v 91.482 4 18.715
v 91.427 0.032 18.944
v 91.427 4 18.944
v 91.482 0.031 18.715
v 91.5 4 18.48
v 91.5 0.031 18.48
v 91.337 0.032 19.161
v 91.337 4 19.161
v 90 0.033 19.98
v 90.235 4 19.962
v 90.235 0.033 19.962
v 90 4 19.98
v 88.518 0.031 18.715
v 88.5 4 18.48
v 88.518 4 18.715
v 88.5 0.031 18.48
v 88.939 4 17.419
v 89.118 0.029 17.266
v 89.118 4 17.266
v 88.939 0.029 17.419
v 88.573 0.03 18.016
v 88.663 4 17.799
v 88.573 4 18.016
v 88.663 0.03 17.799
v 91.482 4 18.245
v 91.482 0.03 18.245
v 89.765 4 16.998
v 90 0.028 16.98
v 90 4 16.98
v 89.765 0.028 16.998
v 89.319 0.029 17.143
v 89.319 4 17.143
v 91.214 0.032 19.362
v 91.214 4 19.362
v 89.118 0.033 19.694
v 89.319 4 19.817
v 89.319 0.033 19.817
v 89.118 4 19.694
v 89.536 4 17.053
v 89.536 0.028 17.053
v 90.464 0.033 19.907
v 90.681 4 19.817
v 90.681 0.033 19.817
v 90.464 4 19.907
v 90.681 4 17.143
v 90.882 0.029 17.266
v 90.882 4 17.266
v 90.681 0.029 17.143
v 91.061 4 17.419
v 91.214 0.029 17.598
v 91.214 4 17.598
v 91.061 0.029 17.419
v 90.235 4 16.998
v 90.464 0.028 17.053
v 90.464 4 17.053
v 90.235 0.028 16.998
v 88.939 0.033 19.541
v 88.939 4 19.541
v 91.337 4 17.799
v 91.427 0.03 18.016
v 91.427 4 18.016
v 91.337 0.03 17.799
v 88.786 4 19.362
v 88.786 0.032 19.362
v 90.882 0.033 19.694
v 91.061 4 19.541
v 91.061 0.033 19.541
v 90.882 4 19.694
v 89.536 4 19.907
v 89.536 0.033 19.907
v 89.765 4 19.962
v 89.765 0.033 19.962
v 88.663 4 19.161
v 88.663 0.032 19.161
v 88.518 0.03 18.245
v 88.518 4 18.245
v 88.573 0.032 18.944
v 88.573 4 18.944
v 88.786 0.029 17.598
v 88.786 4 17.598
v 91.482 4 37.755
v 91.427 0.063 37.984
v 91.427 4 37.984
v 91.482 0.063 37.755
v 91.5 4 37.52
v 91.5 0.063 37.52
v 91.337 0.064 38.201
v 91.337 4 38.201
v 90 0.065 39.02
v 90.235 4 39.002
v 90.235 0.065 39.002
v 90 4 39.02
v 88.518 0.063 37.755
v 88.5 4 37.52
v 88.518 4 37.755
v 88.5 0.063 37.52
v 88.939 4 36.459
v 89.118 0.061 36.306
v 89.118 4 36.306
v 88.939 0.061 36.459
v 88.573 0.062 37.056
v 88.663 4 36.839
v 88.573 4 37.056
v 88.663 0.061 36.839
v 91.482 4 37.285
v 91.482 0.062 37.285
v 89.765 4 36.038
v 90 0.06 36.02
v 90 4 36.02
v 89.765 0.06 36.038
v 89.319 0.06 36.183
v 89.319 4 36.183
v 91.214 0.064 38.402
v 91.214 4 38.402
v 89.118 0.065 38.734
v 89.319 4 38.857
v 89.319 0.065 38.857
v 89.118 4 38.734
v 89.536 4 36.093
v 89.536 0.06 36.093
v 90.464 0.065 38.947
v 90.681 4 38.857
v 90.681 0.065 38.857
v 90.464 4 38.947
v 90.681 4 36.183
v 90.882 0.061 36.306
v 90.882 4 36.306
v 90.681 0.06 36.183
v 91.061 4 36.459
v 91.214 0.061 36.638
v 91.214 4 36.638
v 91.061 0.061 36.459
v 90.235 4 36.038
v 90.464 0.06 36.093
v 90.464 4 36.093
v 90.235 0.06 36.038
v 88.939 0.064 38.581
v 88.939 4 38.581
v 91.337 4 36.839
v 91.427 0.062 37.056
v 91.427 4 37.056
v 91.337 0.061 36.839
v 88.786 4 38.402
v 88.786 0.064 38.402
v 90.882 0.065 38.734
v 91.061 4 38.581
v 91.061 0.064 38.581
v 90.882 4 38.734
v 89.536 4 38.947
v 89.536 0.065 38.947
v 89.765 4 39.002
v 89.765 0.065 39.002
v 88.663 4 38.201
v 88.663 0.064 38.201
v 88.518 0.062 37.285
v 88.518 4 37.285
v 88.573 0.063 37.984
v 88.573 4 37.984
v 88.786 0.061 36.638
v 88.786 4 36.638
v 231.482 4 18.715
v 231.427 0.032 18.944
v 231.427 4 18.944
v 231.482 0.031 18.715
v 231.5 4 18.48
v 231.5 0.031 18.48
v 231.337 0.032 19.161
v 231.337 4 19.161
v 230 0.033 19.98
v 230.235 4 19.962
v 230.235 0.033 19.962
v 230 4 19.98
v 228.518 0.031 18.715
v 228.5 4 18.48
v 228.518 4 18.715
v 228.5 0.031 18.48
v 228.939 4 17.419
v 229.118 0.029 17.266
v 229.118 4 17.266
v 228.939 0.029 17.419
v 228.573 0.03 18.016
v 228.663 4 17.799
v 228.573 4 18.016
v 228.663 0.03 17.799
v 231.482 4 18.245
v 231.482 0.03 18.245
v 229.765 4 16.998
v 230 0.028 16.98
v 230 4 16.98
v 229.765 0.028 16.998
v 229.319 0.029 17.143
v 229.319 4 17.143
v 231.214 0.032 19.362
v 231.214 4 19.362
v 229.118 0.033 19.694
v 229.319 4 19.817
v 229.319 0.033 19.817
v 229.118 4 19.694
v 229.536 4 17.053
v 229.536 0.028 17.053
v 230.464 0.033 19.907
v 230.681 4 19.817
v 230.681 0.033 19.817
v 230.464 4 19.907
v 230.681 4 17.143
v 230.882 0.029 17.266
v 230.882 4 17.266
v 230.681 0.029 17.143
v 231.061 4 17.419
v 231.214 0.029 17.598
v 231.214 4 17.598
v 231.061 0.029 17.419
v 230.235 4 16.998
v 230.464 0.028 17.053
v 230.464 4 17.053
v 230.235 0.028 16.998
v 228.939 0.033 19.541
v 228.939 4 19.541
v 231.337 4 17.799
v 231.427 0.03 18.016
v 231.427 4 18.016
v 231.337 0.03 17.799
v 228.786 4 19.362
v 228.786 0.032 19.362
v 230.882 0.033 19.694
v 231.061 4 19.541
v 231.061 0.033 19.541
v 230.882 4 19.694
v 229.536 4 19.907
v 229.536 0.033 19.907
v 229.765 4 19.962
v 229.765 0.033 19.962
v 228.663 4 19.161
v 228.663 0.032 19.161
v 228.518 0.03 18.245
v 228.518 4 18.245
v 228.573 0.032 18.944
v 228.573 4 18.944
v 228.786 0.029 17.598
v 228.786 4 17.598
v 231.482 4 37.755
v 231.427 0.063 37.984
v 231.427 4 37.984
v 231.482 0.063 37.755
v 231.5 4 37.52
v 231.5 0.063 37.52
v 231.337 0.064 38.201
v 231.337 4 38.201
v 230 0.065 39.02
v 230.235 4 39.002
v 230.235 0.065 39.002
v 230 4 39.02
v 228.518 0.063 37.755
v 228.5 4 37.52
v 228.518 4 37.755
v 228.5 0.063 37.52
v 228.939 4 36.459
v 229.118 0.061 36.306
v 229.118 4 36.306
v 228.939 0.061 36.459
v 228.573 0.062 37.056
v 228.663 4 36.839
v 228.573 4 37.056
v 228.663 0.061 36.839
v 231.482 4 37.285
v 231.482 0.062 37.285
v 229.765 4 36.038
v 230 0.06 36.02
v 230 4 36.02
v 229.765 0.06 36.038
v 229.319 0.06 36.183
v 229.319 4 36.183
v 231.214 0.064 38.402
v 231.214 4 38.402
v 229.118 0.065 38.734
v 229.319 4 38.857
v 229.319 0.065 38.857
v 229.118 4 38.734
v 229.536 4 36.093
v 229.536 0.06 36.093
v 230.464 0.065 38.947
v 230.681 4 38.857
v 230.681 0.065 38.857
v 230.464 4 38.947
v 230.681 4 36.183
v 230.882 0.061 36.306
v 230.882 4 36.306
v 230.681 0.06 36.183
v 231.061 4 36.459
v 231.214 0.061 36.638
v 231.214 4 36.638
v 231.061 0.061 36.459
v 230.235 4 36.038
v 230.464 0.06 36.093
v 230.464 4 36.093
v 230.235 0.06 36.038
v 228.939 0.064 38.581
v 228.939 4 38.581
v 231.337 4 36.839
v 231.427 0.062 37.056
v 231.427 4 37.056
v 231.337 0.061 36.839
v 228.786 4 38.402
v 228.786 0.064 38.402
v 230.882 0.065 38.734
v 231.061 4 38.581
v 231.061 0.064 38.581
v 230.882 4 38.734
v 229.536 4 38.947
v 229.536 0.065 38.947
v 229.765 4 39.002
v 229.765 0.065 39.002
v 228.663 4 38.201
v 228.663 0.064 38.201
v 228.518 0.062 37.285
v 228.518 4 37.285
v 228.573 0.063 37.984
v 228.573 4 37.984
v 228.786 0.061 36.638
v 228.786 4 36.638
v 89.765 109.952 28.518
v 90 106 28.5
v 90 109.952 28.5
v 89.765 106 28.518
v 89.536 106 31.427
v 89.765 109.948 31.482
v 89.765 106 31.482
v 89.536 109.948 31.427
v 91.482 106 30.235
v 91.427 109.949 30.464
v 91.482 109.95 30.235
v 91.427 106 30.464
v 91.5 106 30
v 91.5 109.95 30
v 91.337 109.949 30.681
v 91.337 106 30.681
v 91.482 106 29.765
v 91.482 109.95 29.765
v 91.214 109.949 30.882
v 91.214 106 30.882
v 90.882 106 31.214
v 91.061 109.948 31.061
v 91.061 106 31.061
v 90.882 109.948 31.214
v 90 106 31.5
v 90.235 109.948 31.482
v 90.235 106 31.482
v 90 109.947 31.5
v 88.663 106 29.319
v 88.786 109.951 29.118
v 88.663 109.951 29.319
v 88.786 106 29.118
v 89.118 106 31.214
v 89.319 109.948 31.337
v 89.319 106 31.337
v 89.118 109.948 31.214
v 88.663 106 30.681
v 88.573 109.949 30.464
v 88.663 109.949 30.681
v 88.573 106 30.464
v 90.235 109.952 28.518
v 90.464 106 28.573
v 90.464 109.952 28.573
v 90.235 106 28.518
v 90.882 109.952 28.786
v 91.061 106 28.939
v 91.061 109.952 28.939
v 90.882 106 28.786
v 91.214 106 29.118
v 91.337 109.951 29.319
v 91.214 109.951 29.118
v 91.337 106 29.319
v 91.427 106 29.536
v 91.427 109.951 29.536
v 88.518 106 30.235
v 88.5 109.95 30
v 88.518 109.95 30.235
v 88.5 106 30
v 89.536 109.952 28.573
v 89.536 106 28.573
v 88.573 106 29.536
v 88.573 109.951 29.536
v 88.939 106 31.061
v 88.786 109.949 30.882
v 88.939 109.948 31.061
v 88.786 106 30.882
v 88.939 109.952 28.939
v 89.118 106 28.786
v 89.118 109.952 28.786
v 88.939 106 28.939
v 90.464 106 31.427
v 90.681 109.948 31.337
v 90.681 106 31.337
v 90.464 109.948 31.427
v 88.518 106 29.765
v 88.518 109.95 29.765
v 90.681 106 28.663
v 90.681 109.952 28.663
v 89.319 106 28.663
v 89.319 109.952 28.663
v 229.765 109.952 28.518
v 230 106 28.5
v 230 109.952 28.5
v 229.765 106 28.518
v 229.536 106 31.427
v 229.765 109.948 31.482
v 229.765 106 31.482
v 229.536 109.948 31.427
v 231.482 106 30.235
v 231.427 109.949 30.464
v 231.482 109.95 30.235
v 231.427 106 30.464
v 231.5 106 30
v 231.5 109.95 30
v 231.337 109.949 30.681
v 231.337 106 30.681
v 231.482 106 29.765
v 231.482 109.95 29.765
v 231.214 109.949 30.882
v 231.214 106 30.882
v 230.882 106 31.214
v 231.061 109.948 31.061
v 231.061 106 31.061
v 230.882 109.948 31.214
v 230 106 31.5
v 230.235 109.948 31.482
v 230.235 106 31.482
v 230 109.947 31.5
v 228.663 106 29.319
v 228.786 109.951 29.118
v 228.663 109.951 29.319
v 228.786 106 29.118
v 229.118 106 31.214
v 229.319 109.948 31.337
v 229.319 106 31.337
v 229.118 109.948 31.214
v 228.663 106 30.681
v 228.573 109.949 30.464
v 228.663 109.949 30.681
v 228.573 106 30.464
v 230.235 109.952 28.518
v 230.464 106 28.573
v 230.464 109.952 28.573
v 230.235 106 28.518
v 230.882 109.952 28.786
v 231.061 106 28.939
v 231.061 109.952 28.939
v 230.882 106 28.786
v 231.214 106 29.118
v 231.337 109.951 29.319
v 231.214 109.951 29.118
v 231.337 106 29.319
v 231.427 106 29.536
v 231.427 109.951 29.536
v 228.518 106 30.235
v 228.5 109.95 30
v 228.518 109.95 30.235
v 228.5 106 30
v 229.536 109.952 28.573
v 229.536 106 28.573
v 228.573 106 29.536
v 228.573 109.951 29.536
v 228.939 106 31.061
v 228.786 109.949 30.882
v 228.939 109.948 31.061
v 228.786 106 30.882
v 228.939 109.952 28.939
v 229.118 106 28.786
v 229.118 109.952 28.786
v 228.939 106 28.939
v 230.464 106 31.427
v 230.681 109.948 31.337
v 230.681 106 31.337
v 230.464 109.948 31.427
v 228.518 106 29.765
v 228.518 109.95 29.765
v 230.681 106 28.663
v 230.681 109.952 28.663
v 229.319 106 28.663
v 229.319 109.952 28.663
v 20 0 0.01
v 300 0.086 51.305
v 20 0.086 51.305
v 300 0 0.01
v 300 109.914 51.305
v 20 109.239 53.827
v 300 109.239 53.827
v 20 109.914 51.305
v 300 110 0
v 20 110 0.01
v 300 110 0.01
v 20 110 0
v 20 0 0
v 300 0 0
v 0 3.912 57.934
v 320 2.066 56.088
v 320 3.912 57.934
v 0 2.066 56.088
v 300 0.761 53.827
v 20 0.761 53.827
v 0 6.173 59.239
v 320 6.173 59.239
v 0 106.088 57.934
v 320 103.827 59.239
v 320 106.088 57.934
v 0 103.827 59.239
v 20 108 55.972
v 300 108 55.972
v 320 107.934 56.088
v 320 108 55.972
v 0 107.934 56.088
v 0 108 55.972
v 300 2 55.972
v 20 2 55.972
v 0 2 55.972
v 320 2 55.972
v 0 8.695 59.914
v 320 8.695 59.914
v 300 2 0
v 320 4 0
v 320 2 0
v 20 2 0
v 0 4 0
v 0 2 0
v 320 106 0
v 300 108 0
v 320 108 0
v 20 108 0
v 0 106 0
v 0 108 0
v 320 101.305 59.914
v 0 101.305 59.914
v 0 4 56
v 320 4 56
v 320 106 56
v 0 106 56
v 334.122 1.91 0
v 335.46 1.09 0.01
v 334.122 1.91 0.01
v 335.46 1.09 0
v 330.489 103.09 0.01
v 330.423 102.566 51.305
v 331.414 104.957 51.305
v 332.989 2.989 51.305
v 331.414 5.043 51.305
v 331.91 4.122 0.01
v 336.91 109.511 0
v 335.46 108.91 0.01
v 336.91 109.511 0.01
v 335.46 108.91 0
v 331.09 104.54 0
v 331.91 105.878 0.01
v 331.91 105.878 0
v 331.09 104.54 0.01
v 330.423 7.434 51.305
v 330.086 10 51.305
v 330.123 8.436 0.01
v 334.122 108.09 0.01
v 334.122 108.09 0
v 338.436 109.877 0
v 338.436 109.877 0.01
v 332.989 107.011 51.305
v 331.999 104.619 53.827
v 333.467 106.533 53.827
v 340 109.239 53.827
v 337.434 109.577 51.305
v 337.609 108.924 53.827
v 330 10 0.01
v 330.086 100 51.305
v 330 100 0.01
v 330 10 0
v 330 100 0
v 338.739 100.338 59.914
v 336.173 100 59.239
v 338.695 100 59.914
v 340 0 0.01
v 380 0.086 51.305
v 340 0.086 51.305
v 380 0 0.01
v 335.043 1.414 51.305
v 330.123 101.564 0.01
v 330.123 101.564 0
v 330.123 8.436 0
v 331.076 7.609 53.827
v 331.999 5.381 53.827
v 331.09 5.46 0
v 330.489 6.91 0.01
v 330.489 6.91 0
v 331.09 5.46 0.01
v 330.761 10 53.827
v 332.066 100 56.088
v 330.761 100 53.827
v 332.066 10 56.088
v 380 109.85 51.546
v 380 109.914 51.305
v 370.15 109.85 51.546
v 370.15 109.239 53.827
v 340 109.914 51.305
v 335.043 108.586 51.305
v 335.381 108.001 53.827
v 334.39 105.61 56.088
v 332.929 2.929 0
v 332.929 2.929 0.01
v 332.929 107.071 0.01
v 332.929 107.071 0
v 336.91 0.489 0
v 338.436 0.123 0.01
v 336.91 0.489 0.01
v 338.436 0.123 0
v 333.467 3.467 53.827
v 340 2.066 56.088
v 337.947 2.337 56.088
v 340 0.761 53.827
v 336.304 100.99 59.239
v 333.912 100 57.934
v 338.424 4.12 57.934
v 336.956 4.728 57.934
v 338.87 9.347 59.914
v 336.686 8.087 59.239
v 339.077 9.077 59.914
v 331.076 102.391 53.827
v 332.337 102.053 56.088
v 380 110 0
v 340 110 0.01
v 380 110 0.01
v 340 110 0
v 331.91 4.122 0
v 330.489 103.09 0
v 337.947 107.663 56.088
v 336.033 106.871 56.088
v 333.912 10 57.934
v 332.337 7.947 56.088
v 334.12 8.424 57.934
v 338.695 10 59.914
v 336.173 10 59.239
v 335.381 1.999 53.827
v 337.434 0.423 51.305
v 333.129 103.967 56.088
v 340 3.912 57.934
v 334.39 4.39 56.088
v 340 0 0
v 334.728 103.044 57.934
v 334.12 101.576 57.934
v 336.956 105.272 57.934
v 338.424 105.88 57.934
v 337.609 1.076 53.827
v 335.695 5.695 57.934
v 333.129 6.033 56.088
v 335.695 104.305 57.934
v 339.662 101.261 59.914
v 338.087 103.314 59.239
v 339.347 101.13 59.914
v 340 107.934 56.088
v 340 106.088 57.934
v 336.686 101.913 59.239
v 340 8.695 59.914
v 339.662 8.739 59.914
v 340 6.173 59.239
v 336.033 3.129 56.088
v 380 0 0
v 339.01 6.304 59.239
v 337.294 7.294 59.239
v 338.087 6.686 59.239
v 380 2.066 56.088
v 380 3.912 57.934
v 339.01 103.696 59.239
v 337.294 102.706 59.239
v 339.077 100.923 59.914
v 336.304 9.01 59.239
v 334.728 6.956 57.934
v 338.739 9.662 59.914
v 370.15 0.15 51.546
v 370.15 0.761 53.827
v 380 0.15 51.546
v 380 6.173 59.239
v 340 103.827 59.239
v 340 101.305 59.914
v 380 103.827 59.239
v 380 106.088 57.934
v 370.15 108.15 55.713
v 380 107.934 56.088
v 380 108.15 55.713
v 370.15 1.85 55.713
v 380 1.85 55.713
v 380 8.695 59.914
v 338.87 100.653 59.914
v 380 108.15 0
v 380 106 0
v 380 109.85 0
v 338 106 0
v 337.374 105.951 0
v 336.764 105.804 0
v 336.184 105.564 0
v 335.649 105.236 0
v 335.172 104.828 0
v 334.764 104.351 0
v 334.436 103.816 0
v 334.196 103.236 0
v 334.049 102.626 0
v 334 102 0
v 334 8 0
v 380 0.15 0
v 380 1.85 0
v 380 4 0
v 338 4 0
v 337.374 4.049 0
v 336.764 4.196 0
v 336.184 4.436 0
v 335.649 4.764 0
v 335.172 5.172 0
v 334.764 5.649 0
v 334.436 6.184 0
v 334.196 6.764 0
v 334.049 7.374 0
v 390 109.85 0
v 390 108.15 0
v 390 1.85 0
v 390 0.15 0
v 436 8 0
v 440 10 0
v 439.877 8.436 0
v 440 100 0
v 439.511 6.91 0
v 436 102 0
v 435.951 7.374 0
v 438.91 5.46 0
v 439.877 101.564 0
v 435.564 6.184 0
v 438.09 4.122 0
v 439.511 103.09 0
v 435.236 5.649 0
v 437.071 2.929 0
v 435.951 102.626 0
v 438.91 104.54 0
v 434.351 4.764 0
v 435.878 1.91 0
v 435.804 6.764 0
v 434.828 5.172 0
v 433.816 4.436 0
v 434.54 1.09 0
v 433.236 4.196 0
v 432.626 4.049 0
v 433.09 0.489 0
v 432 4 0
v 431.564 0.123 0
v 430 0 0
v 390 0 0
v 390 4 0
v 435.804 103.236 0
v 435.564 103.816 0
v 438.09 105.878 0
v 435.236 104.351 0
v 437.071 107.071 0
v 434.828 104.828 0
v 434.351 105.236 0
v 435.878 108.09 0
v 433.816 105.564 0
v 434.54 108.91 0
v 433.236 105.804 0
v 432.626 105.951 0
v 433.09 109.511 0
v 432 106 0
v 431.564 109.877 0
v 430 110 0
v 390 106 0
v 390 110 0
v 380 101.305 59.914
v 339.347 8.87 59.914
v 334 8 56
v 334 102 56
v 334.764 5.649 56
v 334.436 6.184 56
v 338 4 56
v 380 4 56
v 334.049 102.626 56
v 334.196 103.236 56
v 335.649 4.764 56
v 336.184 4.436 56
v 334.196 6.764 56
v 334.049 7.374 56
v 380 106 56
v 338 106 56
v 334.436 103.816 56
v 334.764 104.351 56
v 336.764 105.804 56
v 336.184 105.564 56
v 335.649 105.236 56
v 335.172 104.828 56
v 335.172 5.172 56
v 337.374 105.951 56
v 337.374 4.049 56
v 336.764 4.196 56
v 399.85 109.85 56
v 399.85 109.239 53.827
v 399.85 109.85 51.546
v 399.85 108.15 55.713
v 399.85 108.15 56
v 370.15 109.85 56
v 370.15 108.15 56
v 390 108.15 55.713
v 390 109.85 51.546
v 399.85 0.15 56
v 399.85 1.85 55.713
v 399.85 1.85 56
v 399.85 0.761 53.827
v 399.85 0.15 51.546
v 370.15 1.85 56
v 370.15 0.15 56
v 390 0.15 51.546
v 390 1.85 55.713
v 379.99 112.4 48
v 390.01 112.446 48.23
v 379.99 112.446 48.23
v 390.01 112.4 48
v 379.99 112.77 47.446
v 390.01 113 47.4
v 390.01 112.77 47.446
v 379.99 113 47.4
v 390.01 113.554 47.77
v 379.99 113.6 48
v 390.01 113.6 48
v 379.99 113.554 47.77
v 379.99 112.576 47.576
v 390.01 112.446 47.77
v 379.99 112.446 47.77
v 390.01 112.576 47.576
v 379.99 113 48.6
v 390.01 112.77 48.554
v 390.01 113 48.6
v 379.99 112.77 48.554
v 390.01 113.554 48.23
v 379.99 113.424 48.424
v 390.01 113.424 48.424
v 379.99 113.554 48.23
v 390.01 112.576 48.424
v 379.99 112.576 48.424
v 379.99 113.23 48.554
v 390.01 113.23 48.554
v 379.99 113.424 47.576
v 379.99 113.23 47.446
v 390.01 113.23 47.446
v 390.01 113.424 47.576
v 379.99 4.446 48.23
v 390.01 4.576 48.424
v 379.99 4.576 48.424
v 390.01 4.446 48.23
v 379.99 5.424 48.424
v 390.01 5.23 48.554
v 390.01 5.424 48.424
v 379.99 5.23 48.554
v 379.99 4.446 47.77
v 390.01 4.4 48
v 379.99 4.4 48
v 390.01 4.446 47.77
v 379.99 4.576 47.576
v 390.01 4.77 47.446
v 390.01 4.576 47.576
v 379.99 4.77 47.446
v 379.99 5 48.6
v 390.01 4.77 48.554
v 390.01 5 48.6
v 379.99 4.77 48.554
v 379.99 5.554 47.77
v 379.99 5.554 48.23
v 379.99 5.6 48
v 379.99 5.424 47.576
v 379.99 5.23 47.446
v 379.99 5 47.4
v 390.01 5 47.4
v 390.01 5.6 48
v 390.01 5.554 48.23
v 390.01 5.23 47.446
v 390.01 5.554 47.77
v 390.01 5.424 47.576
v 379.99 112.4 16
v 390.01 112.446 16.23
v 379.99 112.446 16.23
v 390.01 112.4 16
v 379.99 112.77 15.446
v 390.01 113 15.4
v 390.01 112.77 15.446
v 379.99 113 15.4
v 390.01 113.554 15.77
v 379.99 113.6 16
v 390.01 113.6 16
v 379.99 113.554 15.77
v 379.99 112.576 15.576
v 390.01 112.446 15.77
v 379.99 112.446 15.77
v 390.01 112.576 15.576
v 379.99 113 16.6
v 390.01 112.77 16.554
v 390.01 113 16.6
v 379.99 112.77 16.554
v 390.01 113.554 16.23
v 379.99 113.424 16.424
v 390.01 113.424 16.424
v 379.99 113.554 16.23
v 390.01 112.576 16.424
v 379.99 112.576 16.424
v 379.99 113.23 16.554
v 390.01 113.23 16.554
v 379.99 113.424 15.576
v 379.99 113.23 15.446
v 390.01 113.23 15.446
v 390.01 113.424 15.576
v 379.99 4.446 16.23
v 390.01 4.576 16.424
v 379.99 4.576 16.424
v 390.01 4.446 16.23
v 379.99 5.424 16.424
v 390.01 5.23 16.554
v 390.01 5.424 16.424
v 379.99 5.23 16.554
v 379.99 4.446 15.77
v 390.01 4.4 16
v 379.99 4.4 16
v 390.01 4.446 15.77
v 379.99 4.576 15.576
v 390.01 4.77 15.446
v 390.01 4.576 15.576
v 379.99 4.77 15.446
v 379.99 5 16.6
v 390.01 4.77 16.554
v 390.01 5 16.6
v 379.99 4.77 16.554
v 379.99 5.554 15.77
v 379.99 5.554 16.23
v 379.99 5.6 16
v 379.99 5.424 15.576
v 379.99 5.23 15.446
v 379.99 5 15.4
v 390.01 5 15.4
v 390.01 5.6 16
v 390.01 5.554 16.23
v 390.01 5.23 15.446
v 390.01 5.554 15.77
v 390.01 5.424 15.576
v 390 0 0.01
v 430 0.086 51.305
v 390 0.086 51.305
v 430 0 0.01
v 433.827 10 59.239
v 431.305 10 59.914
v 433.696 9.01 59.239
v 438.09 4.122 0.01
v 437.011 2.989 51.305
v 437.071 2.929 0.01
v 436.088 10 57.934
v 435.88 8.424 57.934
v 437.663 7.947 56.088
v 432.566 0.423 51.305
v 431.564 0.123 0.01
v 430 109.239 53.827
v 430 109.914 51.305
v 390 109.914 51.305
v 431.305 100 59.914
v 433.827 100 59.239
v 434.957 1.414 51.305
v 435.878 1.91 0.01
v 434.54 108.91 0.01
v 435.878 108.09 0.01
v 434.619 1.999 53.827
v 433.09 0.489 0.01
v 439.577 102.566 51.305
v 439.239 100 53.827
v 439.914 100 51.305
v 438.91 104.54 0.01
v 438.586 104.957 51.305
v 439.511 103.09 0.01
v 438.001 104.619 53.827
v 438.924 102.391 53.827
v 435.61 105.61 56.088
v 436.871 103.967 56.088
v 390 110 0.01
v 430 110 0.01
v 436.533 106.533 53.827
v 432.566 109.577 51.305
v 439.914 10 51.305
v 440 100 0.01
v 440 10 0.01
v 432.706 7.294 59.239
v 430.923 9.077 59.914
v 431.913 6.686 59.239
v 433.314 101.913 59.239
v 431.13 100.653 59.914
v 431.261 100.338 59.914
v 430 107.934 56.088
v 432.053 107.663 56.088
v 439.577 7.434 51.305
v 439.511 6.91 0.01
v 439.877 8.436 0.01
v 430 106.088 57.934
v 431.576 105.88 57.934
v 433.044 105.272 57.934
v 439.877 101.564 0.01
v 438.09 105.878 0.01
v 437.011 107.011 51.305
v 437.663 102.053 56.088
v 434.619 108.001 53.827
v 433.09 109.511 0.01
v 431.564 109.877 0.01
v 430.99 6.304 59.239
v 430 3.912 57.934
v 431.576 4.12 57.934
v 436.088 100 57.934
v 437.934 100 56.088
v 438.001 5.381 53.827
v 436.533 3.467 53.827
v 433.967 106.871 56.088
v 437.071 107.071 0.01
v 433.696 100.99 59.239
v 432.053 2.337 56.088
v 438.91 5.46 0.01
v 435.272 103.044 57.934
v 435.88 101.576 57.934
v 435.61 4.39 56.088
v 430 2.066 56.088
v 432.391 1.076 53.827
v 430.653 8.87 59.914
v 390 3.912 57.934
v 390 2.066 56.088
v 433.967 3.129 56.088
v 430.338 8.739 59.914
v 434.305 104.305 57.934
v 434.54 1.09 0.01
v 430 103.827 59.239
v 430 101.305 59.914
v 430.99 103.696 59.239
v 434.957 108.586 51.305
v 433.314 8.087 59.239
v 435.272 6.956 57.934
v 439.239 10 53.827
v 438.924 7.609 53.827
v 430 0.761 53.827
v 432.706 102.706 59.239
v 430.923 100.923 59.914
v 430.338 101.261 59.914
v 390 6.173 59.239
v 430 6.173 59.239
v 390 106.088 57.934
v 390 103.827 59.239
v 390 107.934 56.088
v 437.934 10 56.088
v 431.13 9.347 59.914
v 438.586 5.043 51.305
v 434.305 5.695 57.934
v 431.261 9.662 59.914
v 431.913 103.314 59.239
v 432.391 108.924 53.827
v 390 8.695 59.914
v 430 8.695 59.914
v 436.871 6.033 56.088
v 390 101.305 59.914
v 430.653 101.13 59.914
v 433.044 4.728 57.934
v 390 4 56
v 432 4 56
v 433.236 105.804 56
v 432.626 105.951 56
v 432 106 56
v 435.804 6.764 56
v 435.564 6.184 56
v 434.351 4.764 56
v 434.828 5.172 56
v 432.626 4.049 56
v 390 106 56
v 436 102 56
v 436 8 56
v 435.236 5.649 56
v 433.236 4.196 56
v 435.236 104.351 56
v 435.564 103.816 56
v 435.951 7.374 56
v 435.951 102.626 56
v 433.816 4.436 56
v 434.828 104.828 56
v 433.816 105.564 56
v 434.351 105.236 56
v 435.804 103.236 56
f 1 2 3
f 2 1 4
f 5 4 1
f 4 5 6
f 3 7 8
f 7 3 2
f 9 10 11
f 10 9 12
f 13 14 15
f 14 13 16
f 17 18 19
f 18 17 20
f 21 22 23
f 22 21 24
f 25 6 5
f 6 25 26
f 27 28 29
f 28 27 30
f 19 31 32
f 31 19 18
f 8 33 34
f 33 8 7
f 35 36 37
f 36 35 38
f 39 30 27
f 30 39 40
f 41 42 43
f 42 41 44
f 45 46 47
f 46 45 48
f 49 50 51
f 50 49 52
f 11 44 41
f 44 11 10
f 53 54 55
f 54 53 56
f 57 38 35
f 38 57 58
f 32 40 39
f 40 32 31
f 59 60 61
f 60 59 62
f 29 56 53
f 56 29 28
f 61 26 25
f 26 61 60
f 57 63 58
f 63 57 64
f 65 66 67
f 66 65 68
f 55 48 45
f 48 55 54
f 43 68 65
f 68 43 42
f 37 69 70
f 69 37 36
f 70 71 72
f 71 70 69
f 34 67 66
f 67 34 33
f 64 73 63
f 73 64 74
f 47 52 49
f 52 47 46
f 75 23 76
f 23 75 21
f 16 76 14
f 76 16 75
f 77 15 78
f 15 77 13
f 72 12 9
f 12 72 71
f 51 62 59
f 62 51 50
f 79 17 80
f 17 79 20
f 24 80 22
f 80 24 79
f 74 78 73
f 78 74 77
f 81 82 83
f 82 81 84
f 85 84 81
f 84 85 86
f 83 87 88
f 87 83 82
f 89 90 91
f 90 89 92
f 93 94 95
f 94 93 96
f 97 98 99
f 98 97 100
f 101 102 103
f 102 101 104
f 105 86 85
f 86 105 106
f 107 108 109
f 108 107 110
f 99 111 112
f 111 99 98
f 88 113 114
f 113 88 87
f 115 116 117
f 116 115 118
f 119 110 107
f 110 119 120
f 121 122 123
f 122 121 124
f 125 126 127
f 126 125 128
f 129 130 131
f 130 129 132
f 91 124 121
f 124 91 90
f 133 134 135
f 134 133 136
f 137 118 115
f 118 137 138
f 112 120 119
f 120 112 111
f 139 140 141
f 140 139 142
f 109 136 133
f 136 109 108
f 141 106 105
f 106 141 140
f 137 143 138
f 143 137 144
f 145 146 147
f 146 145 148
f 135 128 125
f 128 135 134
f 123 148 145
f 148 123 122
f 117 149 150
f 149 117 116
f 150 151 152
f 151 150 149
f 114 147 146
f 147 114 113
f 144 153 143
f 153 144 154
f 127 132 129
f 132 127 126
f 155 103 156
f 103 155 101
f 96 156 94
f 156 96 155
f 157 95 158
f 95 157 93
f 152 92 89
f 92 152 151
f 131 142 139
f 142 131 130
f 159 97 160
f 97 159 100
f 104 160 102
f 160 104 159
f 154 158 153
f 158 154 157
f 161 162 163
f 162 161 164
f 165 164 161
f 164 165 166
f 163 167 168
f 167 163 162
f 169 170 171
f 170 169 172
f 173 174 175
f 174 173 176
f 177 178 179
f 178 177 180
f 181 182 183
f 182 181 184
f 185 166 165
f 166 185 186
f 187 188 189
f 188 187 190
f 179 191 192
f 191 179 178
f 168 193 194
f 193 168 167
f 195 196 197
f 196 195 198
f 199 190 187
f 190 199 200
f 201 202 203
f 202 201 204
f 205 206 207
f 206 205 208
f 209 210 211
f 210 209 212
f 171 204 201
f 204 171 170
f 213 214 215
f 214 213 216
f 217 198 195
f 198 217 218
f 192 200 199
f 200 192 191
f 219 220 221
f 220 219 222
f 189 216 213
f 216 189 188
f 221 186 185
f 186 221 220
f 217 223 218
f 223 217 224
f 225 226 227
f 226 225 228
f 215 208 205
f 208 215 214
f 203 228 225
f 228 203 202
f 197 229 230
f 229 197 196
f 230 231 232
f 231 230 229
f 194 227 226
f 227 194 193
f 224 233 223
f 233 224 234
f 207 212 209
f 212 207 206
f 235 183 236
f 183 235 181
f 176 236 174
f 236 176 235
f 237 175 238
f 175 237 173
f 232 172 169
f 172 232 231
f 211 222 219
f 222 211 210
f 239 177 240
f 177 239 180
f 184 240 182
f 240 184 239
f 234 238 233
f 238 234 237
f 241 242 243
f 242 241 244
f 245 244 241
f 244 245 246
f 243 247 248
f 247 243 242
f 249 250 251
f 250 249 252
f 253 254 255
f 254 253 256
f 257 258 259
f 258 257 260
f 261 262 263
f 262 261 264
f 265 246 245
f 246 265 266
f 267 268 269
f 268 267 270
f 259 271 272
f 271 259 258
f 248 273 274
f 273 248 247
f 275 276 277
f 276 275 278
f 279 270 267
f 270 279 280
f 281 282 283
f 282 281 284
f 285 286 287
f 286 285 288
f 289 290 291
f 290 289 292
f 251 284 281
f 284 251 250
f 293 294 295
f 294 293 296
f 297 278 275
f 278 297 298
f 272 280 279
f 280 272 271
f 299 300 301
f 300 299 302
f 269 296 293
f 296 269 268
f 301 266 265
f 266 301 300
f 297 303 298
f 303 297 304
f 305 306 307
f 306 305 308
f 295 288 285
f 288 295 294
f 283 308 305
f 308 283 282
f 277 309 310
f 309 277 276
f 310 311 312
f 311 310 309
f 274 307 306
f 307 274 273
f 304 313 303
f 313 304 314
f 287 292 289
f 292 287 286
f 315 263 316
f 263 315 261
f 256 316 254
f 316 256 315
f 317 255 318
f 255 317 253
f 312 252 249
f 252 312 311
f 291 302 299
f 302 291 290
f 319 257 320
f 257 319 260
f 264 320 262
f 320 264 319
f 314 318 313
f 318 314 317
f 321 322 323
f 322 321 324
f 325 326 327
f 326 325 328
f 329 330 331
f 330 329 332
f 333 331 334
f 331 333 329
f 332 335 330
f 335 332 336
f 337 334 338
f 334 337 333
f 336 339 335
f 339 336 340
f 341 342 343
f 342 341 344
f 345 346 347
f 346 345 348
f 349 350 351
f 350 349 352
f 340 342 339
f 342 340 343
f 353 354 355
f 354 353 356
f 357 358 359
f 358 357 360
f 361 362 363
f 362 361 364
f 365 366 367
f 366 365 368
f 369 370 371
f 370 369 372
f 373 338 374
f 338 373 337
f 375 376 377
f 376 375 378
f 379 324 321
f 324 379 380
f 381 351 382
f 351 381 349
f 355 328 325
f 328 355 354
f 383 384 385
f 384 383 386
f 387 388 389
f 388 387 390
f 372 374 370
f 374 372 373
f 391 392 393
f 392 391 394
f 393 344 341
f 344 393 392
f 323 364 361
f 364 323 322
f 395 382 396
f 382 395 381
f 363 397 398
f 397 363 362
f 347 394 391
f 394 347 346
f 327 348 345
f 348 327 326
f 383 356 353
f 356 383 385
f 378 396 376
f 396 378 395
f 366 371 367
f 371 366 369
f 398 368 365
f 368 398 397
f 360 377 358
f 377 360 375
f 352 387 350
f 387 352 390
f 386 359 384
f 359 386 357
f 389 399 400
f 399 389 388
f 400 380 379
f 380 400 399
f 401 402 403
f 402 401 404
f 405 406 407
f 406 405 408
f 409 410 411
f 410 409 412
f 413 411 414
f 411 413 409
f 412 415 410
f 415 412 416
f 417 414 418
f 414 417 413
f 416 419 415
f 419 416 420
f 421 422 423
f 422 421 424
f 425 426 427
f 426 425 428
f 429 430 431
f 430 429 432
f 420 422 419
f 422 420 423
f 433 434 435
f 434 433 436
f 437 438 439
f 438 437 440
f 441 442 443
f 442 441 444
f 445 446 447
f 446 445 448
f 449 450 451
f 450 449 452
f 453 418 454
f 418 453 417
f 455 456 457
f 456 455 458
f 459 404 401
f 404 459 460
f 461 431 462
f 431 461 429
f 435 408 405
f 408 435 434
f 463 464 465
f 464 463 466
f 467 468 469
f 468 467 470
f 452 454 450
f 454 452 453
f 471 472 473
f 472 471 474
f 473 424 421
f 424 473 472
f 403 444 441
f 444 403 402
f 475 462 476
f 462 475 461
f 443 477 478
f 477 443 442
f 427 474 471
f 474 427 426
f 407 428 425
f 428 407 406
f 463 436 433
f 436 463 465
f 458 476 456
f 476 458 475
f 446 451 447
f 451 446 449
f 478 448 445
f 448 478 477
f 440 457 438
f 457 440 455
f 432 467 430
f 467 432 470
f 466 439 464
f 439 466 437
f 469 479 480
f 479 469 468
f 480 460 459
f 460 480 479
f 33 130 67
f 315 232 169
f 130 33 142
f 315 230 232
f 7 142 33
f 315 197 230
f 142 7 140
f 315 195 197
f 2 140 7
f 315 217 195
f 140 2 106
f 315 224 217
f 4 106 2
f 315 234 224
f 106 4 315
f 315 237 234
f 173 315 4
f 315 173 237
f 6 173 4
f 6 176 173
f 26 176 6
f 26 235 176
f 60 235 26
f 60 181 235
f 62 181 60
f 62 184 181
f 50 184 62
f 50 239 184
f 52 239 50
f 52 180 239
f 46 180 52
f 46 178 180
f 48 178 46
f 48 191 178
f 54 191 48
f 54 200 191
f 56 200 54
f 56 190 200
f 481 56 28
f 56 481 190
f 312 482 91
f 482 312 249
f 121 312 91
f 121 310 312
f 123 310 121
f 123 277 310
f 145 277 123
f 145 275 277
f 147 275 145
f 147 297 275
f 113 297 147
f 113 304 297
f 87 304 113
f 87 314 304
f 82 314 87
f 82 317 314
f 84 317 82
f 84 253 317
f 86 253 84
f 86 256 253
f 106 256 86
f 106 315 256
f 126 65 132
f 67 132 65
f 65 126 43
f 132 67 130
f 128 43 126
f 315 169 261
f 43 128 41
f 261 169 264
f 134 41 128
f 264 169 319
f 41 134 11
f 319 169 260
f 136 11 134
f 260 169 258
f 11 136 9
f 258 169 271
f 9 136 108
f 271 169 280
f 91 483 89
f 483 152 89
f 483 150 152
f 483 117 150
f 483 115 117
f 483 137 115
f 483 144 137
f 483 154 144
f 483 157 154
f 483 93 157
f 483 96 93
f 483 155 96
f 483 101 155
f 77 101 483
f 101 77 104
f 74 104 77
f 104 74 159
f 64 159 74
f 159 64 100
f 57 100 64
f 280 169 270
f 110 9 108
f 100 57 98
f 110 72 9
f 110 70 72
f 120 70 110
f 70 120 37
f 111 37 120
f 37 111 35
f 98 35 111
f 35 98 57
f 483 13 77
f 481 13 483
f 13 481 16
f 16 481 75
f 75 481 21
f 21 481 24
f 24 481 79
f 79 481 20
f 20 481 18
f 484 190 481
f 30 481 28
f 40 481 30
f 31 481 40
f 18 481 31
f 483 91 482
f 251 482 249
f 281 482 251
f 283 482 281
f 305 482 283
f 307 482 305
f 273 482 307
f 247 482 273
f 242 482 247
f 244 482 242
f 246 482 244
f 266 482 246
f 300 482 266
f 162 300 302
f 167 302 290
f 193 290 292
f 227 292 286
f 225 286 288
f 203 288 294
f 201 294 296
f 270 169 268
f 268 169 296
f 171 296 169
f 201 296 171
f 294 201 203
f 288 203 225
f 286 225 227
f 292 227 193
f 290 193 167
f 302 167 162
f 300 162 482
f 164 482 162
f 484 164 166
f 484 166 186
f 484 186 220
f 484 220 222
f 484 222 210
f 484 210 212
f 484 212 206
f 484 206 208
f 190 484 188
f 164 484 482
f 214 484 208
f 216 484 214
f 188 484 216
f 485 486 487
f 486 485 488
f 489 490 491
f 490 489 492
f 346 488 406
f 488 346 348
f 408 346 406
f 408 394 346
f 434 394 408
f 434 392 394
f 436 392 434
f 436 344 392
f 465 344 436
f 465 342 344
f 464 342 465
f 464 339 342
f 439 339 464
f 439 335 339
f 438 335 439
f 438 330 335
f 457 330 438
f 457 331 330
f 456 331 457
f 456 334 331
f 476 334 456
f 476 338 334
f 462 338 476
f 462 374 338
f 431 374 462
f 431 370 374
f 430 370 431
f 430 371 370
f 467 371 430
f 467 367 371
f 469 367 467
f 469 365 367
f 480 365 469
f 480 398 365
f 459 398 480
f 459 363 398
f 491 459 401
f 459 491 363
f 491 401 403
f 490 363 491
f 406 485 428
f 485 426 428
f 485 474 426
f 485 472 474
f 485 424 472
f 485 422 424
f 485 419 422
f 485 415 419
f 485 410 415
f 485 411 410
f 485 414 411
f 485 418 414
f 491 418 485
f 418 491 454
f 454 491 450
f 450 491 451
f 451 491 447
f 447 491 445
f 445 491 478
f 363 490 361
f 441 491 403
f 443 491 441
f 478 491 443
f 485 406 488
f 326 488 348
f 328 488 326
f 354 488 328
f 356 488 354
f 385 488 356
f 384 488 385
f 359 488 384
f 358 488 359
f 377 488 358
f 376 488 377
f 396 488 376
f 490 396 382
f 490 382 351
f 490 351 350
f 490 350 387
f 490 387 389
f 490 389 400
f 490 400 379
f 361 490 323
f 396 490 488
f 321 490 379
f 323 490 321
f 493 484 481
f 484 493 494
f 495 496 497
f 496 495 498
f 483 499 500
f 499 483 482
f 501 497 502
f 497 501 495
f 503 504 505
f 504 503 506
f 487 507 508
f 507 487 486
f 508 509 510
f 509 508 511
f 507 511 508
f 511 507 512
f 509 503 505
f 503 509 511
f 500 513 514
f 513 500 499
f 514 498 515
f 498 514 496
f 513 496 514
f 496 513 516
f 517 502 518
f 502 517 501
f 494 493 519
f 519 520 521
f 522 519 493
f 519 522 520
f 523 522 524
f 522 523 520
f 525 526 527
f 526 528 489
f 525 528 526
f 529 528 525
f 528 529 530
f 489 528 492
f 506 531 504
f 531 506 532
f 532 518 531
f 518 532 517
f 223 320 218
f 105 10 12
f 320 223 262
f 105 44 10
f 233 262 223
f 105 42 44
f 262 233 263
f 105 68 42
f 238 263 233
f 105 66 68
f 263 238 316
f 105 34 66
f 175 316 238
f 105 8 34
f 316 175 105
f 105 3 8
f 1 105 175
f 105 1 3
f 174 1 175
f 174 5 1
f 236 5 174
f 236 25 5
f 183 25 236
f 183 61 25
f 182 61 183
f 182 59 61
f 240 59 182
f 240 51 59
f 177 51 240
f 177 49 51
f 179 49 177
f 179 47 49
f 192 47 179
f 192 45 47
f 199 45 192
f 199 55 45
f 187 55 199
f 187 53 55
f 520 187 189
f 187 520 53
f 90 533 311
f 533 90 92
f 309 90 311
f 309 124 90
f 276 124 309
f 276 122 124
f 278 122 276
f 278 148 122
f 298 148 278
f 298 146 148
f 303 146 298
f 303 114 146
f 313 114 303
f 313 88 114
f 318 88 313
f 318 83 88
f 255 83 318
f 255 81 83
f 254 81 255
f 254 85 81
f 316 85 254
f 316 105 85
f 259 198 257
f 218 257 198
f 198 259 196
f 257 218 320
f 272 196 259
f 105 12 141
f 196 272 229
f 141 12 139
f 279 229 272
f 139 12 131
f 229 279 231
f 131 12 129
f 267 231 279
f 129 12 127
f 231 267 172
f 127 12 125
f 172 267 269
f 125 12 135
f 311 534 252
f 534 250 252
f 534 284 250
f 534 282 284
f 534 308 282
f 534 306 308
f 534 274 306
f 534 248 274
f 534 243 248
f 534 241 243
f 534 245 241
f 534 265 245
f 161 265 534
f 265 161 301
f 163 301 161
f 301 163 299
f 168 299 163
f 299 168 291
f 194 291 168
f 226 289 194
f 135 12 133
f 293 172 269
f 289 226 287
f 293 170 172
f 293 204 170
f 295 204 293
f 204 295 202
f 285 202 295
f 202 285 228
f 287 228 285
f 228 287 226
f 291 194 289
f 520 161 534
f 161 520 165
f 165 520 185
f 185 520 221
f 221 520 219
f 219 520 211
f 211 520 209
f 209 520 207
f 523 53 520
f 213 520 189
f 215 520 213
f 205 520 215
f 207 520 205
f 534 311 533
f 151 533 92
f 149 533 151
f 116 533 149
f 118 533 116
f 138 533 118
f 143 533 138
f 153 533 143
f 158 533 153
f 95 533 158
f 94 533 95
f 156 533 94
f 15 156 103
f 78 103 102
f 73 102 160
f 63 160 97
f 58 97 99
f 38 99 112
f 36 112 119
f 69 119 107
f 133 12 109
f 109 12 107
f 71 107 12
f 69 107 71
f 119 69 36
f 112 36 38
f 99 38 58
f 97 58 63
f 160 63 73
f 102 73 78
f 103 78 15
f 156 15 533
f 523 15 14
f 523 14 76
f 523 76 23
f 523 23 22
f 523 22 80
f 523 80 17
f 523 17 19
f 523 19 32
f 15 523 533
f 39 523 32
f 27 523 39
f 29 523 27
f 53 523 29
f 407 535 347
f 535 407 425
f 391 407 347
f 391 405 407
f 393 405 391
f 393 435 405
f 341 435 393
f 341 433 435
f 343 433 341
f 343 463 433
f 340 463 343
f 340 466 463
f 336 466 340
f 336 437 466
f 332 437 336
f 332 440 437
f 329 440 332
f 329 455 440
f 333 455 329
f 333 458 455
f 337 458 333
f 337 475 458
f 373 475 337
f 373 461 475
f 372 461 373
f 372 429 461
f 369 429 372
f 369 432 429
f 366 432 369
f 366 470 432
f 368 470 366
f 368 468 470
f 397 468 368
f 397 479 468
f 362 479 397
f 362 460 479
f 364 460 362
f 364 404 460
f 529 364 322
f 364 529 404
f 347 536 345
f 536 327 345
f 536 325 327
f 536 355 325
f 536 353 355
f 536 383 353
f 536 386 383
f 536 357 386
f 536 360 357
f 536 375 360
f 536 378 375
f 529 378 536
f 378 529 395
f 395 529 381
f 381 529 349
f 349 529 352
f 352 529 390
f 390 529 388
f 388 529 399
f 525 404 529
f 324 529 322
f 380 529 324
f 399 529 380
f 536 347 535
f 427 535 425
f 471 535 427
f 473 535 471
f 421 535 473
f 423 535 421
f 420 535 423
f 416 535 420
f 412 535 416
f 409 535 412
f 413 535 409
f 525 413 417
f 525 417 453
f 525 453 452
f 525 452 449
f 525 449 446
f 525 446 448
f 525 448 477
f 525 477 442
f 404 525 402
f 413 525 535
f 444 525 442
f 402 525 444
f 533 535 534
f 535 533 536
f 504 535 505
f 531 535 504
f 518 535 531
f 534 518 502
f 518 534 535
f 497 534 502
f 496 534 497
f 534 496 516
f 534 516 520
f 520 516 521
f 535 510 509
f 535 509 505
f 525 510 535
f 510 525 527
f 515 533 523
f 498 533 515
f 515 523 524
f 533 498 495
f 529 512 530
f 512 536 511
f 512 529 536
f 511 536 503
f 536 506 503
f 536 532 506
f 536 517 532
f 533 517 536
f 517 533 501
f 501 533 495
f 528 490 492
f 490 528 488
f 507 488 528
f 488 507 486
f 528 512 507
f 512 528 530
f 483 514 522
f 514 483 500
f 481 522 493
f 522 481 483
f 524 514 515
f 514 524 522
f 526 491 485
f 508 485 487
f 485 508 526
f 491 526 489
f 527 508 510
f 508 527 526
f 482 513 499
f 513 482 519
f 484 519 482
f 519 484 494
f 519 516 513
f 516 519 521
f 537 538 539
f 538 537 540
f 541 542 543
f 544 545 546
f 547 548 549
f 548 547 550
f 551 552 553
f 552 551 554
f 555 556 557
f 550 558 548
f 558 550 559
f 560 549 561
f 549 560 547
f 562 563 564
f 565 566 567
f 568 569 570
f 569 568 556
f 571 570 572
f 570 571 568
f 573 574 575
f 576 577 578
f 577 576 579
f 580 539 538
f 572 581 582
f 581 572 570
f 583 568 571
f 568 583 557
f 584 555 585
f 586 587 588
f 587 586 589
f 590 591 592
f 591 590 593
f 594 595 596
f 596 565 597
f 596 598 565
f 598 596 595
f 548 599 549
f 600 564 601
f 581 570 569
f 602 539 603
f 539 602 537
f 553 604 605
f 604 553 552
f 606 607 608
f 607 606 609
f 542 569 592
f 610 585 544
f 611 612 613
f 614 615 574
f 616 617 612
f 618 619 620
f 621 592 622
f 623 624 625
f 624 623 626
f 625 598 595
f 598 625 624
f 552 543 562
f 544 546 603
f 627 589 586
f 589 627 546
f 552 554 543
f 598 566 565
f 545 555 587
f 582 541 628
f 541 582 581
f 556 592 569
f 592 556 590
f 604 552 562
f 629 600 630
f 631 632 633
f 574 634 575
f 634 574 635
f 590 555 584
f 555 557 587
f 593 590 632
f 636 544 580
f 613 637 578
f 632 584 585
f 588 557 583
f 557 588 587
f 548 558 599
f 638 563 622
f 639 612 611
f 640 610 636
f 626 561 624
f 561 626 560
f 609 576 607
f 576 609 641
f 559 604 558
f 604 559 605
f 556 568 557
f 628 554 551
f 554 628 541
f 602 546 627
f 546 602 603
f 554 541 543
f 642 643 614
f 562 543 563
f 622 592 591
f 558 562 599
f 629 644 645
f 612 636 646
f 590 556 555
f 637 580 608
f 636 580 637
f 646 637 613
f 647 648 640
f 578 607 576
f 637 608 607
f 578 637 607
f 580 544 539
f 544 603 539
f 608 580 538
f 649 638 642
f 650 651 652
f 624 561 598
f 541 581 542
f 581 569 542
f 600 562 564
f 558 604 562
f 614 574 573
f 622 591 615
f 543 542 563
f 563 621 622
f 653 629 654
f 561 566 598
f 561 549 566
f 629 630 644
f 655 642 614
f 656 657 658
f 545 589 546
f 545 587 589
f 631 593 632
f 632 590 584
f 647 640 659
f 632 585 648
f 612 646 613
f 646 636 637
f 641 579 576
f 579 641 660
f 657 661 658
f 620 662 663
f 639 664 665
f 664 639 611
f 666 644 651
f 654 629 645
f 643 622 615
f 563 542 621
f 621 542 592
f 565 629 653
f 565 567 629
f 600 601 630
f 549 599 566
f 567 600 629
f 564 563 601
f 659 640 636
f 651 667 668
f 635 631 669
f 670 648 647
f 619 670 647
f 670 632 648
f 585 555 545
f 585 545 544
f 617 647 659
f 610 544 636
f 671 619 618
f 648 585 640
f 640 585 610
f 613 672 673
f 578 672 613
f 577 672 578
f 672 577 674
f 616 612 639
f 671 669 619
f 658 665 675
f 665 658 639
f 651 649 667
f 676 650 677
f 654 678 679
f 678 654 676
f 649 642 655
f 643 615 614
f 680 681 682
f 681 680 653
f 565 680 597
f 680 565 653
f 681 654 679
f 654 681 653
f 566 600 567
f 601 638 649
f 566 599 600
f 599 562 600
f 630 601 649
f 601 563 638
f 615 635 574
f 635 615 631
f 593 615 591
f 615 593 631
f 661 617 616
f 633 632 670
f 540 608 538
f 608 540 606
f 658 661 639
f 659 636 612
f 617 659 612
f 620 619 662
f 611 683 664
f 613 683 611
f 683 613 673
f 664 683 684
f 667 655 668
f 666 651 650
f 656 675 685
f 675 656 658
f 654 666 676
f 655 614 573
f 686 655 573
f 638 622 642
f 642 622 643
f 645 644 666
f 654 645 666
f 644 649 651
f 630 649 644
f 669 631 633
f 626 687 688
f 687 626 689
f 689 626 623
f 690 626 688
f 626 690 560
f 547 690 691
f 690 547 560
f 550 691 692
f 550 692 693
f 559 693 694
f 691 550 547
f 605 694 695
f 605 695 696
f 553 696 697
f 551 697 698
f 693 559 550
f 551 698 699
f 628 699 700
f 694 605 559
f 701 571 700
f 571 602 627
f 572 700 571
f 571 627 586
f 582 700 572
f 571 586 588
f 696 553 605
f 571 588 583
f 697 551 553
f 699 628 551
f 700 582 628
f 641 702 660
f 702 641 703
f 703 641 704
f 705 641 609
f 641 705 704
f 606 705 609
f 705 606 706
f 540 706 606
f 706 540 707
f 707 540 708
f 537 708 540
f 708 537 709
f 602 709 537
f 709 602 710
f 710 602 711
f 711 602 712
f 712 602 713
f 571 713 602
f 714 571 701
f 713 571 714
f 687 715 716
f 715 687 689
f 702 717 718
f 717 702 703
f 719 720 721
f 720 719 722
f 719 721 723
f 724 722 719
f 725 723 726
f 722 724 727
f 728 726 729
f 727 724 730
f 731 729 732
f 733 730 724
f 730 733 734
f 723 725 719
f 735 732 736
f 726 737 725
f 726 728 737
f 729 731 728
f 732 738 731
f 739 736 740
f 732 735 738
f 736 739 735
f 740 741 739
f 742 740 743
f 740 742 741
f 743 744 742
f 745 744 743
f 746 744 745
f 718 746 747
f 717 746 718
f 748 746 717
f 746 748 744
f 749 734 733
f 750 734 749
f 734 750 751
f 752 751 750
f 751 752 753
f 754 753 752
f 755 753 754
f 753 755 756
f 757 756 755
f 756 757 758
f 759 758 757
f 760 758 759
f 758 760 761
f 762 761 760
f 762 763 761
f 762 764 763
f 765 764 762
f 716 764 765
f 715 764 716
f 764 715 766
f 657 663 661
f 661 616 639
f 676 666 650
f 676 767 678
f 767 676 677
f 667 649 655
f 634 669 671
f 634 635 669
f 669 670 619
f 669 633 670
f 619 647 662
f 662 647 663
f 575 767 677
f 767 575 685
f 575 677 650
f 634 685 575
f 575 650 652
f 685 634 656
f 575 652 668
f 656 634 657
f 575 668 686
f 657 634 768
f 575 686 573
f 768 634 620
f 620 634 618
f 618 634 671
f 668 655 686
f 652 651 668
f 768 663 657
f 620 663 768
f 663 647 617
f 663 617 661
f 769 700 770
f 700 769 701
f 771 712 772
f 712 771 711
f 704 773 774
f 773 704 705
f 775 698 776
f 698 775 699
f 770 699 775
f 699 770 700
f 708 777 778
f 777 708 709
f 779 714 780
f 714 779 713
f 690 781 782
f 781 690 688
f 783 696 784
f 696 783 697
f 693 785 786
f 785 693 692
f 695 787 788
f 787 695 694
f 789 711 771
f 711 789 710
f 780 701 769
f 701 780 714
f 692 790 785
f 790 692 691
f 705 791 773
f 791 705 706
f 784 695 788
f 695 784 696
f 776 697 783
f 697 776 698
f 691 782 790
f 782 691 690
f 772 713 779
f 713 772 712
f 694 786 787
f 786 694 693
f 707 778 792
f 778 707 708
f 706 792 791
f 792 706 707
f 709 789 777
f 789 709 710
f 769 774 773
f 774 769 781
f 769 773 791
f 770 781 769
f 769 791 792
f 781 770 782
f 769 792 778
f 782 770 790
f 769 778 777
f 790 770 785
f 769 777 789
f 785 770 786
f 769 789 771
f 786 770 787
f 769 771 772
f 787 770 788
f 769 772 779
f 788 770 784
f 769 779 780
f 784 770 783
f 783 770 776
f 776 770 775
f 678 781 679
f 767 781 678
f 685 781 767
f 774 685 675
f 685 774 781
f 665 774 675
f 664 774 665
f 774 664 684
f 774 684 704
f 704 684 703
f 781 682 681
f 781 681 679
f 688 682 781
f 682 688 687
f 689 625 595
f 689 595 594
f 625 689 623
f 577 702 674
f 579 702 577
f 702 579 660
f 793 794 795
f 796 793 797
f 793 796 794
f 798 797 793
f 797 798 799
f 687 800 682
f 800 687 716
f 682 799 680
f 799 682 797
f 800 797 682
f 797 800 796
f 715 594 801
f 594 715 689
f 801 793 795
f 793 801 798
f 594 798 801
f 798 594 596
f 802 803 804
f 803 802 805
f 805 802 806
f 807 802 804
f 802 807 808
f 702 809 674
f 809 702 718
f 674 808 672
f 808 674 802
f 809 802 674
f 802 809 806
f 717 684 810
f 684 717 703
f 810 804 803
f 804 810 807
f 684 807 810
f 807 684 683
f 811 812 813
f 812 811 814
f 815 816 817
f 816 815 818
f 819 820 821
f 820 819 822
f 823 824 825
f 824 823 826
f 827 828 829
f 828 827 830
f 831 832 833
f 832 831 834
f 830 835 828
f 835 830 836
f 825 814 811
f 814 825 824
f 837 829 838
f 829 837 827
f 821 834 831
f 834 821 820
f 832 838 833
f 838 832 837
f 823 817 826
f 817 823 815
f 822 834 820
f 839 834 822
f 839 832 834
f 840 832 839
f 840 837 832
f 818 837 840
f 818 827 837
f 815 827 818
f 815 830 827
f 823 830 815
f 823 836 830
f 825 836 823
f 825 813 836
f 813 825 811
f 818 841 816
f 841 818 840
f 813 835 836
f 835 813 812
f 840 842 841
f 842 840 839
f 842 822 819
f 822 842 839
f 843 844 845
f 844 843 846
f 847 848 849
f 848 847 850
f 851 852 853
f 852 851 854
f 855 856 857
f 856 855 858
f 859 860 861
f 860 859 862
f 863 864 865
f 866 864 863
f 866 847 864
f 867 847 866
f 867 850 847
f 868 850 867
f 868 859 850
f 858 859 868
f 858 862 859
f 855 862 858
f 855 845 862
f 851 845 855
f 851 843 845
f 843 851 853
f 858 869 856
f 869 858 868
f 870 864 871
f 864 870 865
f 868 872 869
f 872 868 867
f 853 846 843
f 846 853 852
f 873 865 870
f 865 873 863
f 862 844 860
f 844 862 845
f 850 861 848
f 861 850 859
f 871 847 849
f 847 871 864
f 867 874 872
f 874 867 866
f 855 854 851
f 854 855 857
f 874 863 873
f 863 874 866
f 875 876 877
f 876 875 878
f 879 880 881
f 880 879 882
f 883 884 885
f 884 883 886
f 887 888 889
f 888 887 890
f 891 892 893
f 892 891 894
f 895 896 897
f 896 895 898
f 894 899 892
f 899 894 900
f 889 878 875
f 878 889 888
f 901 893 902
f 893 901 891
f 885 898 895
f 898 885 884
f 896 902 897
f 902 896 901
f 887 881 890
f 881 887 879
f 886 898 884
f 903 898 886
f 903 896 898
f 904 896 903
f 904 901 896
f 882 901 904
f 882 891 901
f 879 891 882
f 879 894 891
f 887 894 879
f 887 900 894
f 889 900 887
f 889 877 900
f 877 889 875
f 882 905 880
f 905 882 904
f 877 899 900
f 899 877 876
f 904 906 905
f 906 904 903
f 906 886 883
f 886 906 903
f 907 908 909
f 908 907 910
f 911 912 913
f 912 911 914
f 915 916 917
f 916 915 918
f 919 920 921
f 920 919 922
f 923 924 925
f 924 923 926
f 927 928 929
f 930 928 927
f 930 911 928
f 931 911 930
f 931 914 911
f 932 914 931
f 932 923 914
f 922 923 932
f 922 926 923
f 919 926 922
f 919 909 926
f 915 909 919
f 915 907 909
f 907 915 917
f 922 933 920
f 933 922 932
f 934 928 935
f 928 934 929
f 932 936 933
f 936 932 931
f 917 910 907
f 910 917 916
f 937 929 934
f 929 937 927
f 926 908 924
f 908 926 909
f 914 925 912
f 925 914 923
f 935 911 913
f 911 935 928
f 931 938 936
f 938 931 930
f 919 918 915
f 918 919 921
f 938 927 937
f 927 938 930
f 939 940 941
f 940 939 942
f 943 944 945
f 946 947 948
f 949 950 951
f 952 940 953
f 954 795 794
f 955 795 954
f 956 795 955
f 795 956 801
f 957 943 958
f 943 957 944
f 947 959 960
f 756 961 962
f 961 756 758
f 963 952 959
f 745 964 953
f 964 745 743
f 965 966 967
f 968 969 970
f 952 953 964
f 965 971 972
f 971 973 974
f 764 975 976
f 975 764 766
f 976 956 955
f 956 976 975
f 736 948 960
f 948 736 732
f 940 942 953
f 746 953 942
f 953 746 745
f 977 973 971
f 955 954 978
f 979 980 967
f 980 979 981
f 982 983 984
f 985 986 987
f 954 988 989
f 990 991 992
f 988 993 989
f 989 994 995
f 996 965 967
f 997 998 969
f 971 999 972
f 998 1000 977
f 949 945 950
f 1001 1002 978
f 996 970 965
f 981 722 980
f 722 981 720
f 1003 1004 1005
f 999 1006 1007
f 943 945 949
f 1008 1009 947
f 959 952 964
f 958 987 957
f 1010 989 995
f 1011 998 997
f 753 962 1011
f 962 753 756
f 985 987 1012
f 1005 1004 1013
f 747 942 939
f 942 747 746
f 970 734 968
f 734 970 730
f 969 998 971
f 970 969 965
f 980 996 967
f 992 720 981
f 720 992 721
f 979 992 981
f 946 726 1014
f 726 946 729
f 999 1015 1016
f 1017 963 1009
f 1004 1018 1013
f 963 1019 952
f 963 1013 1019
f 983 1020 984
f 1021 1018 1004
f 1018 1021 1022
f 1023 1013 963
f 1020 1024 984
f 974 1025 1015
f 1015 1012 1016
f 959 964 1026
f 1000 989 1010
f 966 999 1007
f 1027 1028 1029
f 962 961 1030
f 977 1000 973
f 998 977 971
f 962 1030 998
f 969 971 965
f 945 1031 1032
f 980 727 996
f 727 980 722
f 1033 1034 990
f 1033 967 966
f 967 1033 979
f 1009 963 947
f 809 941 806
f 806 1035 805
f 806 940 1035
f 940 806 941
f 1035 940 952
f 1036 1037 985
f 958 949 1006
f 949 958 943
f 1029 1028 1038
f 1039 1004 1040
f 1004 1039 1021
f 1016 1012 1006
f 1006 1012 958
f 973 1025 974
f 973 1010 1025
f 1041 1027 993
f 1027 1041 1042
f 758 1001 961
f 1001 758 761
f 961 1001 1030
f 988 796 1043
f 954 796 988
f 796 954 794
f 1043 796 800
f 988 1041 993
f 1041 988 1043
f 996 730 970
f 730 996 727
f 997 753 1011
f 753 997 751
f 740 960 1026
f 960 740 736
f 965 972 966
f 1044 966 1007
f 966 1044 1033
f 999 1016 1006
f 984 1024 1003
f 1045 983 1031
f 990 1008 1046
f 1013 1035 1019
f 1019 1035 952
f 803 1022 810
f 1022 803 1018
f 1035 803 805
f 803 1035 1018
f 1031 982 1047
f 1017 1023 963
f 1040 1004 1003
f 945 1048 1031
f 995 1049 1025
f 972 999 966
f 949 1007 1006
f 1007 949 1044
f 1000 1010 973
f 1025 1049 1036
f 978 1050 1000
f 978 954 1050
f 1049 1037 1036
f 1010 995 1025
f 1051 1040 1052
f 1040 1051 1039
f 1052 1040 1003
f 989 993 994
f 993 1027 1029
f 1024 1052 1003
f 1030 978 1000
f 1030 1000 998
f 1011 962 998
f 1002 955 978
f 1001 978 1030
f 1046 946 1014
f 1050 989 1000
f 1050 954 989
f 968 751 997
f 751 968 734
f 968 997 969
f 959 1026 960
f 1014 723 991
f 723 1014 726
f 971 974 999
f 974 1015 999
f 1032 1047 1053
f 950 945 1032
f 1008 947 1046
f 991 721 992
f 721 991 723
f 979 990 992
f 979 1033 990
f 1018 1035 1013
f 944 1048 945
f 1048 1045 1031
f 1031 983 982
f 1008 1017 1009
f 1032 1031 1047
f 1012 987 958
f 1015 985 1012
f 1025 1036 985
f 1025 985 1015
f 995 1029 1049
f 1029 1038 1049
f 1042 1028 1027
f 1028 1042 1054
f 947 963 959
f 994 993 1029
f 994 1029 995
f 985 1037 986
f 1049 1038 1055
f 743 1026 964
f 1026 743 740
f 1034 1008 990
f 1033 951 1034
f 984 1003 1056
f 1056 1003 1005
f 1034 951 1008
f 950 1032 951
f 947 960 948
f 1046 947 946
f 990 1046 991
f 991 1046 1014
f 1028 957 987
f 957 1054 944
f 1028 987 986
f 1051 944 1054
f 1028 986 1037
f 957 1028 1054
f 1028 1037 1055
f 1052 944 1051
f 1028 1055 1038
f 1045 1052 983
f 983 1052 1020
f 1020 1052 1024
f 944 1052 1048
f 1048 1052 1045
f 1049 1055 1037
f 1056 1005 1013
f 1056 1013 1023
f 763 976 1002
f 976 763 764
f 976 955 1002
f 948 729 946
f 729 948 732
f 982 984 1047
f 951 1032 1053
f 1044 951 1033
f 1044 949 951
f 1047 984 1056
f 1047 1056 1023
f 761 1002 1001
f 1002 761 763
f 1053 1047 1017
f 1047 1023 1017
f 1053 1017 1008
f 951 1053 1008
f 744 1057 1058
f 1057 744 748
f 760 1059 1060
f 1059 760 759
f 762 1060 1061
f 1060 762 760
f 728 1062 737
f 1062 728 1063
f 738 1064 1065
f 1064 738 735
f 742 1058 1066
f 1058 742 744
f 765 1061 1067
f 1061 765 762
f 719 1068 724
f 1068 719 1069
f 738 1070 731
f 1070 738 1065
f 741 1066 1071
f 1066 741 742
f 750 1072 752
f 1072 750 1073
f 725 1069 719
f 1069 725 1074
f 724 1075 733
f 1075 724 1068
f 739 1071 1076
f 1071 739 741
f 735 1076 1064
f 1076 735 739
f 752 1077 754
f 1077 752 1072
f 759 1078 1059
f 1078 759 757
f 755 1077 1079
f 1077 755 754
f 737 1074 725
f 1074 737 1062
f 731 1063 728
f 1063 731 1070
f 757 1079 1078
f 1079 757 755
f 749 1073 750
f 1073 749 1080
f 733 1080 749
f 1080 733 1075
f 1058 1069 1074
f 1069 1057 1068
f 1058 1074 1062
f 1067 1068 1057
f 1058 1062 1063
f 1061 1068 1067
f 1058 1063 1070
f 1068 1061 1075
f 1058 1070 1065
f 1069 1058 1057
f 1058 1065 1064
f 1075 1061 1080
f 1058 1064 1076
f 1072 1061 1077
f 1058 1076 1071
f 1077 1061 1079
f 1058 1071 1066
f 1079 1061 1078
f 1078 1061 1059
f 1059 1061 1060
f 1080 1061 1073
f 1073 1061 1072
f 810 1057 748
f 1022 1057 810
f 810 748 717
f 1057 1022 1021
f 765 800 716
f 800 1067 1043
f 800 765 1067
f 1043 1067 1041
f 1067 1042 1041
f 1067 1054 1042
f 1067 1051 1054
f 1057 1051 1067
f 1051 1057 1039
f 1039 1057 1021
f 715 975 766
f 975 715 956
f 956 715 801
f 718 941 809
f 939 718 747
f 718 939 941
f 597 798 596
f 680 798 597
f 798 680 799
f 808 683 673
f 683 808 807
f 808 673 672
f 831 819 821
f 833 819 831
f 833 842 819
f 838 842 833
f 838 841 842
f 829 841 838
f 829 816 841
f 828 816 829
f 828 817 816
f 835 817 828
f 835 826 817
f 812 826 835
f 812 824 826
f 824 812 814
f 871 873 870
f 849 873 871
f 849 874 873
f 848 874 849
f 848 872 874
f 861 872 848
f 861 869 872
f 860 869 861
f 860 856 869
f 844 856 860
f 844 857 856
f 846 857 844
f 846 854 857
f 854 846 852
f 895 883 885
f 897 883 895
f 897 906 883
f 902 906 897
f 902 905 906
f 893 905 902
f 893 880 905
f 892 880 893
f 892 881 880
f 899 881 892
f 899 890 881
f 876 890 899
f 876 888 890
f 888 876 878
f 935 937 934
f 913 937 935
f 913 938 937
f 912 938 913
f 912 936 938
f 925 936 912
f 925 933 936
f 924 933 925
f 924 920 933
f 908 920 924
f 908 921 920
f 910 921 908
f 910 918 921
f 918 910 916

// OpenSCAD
include <protective_storage_box.scad>
lid_angle = 0;
show_tray_in_assembly = false;
render_assembly = false;
// All lid parts on one plate
print_plate_lid();
